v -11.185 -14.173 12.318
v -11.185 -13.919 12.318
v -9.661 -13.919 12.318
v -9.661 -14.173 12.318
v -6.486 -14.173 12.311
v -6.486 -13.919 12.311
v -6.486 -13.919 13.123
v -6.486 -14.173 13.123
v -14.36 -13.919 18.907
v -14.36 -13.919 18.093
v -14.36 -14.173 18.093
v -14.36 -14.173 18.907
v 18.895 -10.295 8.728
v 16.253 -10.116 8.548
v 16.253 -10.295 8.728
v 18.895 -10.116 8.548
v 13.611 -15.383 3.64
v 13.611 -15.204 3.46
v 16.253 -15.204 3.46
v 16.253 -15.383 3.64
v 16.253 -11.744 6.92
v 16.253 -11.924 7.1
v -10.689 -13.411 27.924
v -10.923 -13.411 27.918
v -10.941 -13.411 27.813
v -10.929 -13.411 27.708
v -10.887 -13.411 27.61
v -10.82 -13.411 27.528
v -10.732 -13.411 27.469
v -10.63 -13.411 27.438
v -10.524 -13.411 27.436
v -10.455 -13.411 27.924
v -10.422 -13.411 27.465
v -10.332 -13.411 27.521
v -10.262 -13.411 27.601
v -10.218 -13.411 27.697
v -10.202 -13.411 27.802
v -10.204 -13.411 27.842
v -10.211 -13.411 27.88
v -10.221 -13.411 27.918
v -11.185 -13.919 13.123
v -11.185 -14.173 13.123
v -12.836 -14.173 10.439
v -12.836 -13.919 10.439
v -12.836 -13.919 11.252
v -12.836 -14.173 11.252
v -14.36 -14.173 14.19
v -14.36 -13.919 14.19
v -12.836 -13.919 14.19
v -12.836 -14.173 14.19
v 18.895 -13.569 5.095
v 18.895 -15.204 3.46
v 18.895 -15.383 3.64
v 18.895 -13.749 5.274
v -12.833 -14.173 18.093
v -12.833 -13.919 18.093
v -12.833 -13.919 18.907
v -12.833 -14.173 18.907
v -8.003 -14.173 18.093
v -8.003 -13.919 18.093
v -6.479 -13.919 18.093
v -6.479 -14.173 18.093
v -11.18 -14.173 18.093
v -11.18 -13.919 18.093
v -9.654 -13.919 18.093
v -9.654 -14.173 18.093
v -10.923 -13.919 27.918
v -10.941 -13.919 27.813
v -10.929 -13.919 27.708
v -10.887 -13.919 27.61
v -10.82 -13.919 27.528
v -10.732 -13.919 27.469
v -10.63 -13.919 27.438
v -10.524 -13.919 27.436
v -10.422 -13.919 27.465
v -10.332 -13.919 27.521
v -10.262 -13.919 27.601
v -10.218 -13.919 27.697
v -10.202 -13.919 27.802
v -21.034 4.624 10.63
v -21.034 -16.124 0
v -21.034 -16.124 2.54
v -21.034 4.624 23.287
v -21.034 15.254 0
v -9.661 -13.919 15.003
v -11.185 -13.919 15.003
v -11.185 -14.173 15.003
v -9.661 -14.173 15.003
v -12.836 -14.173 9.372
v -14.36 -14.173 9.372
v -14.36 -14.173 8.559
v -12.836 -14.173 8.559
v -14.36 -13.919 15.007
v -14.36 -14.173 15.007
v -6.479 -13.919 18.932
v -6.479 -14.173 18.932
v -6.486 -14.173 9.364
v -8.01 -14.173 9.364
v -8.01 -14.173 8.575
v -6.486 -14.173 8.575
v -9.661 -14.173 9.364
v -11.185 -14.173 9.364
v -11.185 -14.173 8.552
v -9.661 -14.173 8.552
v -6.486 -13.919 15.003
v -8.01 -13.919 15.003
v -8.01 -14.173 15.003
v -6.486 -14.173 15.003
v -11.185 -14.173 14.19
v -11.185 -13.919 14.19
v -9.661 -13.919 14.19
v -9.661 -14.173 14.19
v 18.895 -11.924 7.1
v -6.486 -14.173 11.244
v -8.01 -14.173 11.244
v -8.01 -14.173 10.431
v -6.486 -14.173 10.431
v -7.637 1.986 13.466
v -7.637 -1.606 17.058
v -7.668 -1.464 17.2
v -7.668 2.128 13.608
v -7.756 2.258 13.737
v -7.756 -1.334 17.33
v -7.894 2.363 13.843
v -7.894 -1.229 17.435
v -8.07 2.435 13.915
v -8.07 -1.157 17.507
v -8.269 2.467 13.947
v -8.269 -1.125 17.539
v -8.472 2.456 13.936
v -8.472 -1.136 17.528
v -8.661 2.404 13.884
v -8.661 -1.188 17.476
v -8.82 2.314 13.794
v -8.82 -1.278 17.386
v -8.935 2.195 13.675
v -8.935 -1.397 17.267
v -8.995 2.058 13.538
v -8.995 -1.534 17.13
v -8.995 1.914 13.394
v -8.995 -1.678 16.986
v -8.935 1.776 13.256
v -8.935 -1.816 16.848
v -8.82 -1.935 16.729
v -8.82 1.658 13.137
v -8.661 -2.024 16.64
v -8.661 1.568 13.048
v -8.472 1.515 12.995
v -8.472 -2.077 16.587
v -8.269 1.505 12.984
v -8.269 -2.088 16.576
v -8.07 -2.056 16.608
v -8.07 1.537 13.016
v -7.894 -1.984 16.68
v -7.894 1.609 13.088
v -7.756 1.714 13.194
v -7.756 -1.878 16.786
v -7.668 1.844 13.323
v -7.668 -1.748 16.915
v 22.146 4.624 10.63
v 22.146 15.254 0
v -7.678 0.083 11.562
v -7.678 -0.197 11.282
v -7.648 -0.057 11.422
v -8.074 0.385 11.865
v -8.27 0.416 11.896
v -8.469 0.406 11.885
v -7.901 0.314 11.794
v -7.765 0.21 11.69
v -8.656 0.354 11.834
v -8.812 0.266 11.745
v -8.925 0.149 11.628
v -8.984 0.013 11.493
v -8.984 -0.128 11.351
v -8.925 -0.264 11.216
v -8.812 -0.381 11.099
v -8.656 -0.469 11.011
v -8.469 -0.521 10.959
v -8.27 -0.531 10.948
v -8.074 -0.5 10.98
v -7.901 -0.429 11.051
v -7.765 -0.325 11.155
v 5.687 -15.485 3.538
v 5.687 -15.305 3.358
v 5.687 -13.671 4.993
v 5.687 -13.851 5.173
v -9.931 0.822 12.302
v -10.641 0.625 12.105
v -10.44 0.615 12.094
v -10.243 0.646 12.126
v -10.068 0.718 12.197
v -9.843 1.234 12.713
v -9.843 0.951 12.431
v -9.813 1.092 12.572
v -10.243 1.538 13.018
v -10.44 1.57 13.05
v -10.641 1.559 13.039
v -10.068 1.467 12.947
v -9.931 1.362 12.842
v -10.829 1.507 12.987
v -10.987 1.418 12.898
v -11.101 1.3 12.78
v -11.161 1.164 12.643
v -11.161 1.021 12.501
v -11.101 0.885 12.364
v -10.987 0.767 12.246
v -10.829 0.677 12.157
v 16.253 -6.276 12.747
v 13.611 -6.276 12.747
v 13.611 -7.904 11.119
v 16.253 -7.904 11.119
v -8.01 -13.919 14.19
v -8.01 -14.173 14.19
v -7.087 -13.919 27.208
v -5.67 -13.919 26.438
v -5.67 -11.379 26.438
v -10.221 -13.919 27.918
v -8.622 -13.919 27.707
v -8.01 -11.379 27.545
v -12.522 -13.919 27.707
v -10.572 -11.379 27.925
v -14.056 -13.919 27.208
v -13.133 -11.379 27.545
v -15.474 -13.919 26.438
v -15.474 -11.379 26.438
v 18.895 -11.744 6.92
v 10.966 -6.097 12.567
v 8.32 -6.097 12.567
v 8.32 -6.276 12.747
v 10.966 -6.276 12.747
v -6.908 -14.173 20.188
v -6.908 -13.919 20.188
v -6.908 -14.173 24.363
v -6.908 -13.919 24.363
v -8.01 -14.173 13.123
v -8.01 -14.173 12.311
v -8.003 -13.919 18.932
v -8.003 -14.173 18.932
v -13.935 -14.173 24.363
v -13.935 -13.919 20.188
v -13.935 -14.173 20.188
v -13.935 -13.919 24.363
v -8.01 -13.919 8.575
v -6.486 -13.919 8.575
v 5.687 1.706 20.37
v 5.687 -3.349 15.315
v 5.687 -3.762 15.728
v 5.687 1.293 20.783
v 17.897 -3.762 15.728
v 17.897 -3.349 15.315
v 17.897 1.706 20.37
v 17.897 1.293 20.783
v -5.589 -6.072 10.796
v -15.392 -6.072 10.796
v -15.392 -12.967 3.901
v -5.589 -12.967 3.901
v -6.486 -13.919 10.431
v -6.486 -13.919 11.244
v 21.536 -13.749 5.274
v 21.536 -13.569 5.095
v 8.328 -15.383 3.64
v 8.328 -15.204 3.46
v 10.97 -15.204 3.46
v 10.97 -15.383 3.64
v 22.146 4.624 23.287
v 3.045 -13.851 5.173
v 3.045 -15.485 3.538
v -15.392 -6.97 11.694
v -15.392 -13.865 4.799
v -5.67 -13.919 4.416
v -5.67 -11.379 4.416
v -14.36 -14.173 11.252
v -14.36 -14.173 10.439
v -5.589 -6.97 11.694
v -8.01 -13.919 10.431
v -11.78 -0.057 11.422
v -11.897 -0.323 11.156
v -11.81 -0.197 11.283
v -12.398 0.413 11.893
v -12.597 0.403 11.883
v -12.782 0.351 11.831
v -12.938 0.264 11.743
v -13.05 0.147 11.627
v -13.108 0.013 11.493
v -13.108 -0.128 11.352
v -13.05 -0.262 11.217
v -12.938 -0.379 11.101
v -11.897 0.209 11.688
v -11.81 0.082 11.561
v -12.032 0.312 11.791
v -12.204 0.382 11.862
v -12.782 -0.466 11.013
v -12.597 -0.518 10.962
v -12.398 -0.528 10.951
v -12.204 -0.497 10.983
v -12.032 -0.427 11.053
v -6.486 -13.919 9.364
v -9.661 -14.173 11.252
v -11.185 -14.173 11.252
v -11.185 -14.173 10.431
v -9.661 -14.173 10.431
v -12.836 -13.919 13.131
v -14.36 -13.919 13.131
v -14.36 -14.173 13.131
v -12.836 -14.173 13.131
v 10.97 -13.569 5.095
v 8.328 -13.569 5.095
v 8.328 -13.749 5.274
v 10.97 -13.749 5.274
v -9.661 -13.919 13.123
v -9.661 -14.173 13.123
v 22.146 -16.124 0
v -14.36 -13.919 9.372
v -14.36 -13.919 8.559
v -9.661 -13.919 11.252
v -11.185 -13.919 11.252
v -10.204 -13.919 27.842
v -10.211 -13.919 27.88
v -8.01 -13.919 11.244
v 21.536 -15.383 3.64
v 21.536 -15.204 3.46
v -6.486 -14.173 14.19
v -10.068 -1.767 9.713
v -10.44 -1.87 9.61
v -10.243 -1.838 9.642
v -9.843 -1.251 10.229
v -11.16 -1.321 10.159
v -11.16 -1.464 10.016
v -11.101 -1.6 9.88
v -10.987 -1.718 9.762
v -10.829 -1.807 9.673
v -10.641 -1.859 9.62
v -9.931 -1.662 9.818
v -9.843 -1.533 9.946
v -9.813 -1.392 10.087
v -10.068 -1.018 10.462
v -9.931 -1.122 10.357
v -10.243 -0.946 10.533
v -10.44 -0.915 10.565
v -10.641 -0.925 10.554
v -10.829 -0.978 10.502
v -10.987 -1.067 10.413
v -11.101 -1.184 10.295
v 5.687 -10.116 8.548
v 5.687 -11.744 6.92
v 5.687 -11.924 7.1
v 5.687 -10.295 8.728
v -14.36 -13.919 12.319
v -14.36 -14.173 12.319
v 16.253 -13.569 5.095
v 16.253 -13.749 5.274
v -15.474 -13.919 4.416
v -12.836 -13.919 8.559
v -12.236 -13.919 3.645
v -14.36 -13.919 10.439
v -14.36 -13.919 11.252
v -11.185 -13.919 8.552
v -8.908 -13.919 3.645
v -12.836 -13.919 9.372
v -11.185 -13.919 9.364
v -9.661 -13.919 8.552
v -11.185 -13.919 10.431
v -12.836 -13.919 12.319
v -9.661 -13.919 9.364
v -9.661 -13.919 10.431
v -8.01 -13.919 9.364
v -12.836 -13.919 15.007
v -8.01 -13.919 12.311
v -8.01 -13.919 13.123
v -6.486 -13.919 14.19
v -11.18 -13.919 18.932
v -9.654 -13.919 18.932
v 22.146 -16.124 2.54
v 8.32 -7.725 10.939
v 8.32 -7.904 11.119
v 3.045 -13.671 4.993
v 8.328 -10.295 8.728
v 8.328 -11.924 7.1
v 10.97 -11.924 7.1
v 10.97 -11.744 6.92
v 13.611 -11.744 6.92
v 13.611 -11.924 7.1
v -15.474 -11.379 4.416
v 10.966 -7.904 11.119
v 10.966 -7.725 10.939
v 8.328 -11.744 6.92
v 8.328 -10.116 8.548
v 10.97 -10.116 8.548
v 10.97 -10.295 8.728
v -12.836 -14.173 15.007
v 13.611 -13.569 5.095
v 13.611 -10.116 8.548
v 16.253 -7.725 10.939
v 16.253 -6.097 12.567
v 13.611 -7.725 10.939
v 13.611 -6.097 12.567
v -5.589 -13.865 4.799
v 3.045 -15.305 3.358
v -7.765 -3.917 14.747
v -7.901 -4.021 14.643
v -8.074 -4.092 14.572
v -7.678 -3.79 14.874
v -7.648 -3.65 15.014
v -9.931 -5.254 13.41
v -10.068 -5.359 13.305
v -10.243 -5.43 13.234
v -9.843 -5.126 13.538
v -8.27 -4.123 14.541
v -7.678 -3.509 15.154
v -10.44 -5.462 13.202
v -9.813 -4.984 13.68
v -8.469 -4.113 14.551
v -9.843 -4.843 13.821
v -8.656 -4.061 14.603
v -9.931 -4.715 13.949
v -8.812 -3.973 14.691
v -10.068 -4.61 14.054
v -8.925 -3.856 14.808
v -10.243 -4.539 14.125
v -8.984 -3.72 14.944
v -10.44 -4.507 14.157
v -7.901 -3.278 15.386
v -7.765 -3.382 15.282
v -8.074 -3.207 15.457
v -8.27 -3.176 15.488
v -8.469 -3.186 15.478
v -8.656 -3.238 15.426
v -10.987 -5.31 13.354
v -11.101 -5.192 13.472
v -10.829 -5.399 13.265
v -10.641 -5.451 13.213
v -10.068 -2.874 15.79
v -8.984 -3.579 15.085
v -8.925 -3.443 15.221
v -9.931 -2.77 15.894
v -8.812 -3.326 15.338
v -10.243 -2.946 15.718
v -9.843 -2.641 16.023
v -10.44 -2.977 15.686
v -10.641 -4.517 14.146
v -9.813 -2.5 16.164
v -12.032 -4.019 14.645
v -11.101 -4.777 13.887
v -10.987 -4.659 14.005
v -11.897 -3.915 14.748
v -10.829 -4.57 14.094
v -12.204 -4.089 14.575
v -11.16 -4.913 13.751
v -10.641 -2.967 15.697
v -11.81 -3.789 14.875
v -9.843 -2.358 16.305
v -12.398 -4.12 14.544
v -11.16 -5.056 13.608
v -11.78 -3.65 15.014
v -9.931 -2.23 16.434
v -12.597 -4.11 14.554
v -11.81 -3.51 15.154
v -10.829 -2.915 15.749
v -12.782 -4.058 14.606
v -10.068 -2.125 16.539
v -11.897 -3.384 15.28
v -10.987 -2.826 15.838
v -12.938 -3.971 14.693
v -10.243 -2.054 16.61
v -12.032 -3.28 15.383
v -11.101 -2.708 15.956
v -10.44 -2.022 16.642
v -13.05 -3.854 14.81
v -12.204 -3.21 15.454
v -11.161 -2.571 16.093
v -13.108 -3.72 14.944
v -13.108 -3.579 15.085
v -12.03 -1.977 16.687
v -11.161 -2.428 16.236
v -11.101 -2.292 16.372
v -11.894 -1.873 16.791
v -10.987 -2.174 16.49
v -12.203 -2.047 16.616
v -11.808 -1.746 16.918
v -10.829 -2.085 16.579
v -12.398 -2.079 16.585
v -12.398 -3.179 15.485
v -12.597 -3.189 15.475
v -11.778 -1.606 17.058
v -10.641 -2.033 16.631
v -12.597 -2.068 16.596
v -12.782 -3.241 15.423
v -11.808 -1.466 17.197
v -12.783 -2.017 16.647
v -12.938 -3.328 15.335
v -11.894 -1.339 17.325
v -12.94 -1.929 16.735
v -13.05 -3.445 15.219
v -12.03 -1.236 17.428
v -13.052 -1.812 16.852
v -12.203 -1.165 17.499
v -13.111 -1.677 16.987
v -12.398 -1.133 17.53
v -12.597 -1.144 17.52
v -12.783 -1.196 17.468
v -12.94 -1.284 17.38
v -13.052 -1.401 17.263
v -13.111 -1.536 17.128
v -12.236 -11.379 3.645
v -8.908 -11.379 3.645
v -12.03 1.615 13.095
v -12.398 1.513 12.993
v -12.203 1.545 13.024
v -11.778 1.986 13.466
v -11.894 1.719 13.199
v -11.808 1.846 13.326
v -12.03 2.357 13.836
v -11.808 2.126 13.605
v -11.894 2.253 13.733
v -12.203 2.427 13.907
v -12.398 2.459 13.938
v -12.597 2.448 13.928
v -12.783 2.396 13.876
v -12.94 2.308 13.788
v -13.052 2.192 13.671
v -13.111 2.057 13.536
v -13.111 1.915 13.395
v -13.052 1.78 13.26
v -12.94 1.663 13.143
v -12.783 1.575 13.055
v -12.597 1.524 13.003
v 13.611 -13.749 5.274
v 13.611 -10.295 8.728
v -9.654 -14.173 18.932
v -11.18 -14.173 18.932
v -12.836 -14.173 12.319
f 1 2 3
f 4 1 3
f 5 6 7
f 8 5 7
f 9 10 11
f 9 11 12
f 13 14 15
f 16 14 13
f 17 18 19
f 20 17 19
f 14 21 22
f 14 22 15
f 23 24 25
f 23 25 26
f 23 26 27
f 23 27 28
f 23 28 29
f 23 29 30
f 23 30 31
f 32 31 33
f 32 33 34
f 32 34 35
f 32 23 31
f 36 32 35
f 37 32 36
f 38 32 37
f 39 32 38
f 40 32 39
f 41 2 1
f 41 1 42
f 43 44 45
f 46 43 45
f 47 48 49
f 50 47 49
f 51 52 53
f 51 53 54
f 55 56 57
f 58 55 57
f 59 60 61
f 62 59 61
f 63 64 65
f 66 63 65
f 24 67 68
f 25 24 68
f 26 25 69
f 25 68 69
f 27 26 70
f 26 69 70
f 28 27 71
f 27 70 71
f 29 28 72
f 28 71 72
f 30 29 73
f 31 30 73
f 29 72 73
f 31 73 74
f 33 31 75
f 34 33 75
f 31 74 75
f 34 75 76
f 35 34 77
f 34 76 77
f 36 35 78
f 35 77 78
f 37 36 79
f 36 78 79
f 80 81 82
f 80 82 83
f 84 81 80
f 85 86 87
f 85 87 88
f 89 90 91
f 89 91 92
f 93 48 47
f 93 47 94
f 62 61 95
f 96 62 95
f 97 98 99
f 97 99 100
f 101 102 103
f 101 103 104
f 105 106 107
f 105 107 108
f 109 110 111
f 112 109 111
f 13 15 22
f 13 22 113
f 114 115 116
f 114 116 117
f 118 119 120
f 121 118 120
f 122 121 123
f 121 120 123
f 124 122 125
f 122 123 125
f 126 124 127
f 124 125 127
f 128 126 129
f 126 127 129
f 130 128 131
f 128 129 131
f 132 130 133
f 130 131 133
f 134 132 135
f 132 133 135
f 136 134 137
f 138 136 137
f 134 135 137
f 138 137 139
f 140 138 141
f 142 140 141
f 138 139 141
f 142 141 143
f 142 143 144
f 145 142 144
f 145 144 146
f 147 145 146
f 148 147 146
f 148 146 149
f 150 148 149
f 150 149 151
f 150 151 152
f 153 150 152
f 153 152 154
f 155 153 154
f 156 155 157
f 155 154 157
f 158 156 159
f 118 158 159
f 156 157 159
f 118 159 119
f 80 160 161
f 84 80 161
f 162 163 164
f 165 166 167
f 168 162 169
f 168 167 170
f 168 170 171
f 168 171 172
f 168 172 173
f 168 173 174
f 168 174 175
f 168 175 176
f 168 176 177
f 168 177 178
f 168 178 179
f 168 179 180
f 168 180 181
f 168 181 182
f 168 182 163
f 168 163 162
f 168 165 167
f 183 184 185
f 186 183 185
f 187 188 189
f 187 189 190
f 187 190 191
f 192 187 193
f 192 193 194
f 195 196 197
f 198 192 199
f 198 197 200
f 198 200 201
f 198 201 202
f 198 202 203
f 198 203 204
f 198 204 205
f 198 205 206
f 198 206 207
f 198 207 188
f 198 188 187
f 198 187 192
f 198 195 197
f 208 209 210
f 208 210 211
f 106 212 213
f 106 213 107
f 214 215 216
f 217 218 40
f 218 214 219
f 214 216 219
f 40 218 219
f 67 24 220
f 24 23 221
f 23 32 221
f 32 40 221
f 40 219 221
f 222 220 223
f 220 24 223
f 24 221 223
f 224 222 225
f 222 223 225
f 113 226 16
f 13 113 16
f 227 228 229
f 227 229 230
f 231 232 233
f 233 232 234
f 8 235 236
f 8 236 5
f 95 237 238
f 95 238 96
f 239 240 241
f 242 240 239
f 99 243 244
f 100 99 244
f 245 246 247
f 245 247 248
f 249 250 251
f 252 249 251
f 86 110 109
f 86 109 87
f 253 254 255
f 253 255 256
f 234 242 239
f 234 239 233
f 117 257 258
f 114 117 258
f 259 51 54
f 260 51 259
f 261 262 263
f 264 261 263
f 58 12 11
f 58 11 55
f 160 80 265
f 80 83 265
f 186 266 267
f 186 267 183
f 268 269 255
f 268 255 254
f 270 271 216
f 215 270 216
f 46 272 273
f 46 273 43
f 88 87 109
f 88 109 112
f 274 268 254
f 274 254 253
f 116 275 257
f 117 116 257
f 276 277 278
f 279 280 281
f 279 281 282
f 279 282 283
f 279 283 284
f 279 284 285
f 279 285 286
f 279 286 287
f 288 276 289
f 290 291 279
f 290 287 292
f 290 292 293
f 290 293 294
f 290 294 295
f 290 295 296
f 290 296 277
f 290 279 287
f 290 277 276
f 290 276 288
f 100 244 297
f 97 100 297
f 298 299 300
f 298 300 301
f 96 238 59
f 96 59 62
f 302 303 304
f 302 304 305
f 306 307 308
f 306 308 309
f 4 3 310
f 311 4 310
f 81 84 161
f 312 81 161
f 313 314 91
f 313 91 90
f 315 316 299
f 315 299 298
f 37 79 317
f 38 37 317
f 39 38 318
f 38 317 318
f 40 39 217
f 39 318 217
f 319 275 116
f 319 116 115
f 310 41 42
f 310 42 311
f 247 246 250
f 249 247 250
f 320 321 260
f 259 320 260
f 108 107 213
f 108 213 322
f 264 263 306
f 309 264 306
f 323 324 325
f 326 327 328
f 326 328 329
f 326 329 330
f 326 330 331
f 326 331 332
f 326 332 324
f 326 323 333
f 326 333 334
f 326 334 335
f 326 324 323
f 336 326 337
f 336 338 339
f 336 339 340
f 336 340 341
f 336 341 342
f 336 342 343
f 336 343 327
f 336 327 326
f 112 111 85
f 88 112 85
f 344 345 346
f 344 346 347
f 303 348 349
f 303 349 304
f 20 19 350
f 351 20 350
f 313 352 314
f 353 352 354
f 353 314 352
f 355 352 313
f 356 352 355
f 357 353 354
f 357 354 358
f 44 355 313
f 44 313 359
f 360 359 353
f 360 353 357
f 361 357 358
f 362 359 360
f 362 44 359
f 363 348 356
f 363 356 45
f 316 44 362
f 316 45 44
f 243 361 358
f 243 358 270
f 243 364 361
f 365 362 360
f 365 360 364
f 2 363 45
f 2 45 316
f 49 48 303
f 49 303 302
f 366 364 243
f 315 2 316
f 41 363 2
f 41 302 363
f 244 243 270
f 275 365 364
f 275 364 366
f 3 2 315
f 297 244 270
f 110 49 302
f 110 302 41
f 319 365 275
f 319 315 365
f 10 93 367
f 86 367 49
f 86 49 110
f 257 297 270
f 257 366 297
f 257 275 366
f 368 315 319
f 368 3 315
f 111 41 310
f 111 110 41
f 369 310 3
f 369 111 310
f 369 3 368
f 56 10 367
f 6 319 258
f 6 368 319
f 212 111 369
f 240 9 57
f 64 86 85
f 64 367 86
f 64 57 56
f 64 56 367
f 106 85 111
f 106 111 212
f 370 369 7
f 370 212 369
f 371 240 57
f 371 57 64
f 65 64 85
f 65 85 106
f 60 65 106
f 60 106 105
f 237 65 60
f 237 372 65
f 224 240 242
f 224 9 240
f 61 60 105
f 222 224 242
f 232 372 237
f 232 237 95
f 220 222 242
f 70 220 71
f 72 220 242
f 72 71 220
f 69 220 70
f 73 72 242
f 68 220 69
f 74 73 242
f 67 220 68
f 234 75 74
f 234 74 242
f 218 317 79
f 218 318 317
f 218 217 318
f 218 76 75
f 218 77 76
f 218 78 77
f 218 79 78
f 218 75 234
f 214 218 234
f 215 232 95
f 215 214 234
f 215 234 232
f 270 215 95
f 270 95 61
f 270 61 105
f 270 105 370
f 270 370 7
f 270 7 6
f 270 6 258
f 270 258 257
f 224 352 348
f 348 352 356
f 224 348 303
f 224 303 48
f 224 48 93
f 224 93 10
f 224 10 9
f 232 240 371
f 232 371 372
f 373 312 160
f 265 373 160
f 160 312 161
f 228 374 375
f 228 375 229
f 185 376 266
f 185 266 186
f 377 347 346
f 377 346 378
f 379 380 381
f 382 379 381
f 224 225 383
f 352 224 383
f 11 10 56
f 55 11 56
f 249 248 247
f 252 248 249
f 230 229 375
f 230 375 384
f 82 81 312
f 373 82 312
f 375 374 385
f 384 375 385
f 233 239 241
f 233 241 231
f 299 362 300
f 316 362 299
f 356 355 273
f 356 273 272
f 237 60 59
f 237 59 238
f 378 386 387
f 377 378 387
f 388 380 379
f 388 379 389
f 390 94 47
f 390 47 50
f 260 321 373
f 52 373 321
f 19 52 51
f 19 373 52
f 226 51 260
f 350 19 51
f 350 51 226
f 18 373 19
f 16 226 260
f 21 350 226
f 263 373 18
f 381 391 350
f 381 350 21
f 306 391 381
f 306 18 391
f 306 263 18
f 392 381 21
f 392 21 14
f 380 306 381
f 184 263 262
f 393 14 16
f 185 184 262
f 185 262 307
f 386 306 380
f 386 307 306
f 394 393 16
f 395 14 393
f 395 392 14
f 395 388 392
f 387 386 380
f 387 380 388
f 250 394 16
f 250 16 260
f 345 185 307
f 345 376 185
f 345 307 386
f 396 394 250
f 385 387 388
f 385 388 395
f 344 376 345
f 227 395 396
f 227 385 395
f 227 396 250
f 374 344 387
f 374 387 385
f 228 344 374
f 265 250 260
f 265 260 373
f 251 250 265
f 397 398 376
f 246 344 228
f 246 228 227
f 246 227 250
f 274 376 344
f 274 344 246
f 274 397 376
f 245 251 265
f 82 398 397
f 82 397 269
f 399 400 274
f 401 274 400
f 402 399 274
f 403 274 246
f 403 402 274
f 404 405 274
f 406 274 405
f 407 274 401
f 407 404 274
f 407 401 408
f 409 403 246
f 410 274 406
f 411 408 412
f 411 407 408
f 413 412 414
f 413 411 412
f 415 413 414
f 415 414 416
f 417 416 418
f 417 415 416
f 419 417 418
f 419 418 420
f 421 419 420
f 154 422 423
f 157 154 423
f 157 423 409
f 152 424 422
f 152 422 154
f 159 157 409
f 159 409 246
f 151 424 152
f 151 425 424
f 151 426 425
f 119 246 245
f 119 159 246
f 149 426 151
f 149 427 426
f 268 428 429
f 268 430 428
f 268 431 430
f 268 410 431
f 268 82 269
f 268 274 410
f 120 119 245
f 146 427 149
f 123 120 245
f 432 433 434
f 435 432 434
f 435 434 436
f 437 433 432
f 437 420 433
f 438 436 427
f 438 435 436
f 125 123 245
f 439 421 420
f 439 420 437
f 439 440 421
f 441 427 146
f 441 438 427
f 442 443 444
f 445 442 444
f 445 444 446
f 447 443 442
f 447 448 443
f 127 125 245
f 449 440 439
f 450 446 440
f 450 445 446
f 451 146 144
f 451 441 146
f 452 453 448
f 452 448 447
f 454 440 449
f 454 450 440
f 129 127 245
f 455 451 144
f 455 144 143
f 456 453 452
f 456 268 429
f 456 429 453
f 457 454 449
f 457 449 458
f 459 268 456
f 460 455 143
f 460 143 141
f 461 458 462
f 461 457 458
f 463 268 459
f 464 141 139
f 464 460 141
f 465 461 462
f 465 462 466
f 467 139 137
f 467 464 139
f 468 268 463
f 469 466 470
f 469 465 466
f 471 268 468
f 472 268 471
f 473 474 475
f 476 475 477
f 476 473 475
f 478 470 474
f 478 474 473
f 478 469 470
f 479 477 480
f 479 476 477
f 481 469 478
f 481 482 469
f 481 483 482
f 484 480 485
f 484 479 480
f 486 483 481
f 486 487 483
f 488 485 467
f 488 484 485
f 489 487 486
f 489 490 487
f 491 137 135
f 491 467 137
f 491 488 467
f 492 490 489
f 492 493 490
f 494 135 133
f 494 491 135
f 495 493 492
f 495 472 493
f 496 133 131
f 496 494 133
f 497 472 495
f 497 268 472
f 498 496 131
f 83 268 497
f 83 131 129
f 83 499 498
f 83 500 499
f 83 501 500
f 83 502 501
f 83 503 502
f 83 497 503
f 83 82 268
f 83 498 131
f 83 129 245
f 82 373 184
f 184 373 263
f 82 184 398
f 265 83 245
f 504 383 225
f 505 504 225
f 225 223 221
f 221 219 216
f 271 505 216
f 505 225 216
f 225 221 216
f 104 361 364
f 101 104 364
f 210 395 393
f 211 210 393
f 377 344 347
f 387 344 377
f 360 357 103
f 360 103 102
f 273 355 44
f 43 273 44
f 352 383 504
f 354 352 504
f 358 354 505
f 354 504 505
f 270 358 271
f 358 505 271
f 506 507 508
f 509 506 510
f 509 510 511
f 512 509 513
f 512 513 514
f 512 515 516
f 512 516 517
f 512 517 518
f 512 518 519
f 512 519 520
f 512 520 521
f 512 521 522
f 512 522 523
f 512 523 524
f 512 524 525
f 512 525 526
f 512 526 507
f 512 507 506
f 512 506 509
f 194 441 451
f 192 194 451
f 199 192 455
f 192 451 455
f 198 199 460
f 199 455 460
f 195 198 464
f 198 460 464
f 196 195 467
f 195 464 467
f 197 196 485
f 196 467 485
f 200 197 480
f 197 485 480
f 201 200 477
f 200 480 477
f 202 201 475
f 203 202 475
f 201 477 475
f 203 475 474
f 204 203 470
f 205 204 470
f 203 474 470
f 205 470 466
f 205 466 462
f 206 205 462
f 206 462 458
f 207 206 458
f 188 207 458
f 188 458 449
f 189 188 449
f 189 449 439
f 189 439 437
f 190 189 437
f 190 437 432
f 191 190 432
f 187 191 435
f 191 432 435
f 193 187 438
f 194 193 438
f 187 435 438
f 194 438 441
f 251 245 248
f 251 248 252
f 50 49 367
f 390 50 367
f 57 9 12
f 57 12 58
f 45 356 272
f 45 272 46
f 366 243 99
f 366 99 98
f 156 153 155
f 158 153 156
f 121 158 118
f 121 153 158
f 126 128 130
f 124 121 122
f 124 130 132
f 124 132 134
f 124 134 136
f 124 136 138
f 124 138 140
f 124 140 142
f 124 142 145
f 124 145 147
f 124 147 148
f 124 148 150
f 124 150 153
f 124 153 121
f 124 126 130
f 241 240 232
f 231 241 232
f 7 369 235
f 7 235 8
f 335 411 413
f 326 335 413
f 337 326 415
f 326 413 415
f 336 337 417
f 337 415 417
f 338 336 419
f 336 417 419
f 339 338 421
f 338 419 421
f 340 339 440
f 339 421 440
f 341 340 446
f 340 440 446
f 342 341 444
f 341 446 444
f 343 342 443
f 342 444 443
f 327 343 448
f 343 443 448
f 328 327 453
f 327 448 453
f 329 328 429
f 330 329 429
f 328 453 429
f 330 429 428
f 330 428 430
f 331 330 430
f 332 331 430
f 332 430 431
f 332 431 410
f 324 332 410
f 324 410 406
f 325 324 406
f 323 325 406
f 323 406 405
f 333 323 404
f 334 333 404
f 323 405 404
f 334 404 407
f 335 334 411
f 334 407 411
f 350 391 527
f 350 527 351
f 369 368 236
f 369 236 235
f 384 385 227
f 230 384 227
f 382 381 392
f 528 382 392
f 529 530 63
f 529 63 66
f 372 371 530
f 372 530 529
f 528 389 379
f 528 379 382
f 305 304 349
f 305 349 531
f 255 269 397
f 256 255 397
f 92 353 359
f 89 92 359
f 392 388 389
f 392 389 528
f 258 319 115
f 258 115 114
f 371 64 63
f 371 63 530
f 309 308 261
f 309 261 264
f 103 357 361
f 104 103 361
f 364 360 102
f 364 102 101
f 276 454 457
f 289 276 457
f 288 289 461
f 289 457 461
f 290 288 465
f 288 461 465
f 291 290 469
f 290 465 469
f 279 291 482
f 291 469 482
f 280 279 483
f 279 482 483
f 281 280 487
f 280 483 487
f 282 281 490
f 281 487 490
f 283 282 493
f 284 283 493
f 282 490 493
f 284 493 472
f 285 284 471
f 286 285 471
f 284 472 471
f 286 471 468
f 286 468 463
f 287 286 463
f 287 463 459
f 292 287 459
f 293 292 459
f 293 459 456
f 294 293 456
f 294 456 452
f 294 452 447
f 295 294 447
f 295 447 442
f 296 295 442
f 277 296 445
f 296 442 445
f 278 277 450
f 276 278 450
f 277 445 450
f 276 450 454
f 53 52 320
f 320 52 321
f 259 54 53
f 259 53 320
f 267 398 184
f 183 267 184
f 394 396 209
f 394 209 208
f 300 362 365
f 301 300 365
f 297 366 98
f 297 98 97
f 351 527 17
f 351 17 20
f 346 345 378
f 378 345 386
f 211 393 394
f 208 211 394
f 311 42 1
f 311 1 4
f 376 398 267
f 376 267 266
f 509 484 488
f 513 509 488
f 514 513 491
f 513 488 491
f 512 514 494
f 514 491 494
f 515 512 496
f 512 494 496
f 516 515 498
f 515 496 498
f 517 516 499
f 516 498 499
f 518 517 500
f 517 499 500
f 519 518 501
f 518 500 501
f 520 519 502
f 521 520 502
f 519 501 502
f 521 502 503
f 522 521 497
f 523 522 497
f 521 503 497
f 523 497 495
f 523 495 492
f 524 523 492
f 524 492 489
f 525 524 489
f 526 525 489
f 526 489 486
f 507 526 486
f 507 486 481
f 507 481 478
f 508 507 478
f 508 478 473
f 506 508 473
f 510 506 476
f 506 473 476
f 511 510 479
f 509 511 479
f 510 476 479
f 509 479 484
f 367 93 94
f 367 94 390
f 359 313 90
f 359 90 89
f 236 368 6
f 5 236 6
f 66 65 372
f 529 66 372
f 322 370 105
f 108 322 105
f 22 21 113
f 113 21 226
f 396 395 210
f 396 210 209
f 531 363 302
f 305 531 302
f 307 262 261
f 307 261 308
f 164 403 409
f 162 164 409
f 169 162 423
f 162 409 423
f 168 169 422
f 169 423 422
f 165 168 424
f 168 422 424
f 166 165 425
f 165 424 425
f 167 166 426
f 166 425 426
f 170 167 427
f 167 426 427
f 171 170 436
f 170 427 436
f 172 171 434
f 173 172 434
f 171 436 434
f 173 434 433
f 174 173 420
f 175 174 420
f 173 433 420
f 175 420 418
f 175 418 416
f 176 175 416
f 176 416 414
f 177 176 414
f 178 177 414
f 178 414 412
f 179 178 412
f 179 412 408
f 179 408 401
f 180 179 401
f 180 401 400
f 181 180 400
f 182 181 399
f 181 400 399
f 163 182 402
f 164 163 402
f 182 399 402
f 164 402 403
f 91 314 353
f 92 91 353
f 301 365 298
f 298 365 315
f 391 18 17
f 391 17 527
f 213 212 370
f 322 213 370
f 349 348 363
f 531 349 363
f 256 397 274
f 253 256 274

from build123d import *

# Parameters (mm, degrees)
F0_W        = 43.18
F0_H        = 20.7474600966
F1_DEPTH    = 25.4
F0_H_2      = 10.629949436
F2_DEPTH    = 12.7
F3_T1_DEPTH = 160.7573462098
F4_T4_DEPTH = 108.5007478943
F5_W        = 9.8024089821
F5_H        = 9.7506272141
F6_DEPTH    = 1.27
F7_W        = 2.6456220075
F7_H        = 2.3024471011
F7_W_2      = 2.6416
F7_H_2      = 2.3024467519
F7_H_3      = 2.3114
F8_DEPTH    = 0.254
F7_W_3      = 12.2105642222
F7_H_4      = 7.1489069227
F9_DEPTH    = 0.5842
F11_DEPTH   = 2.54
F13_W       = 1.524
F13_H       = 0.8168006316
F13_H_2     = 0.8128
F13_H_3     = 0.8049504831
F13_H_4     = 0.82042
F13_H_5     = 0.7896171883
F13_W_2     = 1.5263203532
F13_H_6     = 0.8140373975
F13_H_7     = 0.8394755423
F13_W_3     = 7.0272386074
F13_H_8     = 4.1753165424
F14_DEPTH   = 0.254
F15_DEPTH   = 0.508
F16_R       = 0.6775746303
F16_R_2     = 0.6719535835
F16_R_3     = 0.6676399197
F16_R_4     = 0.6773005459
F16_R_5     = 0.6826296901
F16_R_6     = 0.6703978175
F17_DEPTH   = 5.08


# Not quite as in the source:
# - a fillet or chamfer that OpenCascade refuses, or shapes differently, is made with other operations: its cross-section is extruded or revolved along the edge and cut away or added
# - a feature names something its author has since deleted; it is built from what else it names


with BuildPart() as f1:
    # F0 (on Top) → F1 (new body)
    with BuildSketch(Plane.XY):
        with Locations((0.5560219288, -5.7501500921)):
            Rectangle(F0_W, F0_H)
    extrude(amount=F1_DEPTH)

    # F0 (on Top) → F2 (join)
    with BuildSketch(Plane.XY):
        with Locations((0.5560219288, 9.9385546742)):
            Rectangle(F0_W, F0_H_2)
    extrude(amount=F2_DEPTH)

    # F3: chamfer of 22.86 on 1 edges, made by hand

    # F3_s2 → F3_t1 (cut)
    with BuildSketch(Plane.YZ.offset(-79.8226511761)):
        Polygon((-16.1238801405, 2.54), (6.7361198595, 25.4), (-16.1238801405, 25.4), align=None)
    extrude(amount=F3_T1_DEPTH, mode=Mode.SUBTRACT)

    # F4: chamfer of 12.7 on 1 edges, made by hand


with BuildPart() as f4_tool2:
    # F4_s3 → F4_t4 (new body)
    with BuildSketch(Plane.YZ.offset(54.806395876)):
        Polygon((2.5535293922, 12.7), (15.2535293922, 0), (15.2535293922, 12.7), align=None)
    extrude(amount=-F4_T4_DEPTH)

    split(bisect_by=Plane.XZ.offset(-4.6235799562), keep=Keep.BOTTOM)


with BuildPart() as f1_1:
    add(f1.part)

    # F4_t1: cut F4_tool2
    add(f4_tool2.part, mode=Mode.SUBTRACT)

    # F5 (on face) → F6 (cut)
    with BuildSketch(Plane(origin=(0, -9.3319400702, 9.3319400702), x_dir=(1, 0, 0), z_dir=(0, -0.7071067812, 0.7071067812))):
        with Locations((-10.4905848857, -1.5347840963)):
            Rectangle(F5_W, F5_H)
    extrude(amount=-F6_DEPTH, mode=Mode.SUBTRACT)

    # F7 (on face) → F8 (join)
    with BuildSketch(Plane(origin=(0, -9.3319400702, 9.3319400702), x_dir=(1, 0, 0), z_dir=(0, -0.7071067812, 0.7071067812))):
        with Locations((9.6429114781, 3.4242669353)):
            Rectangle(F7_W, F7_H)
        with Locations((14.9321444894, 3.4242669353)):
            Rectangle(F7_W_2, F7_H)
        with Locations((7.0073444894, -2.2598968935)):
            Rectangle(F7_W_2, F7_H_2)
        with Locations((12.2905444894, -2.2598968935)):
            Rectangle(F7_W_2, F7_H_2)
        with Locations((17.5737444894, -2.2598968935)):
            Rectangle(F7_W_2, F7_H_2)
        with Locations((4.3657444894, -7.2920206692)):
            Rectangle(F7_W_2, F7_H_3)
        with Locations((9.6489444894, -7.1481164303)):
            Rectangle(F7_W_2, F7_H_3)
        with Locations((14.9321444894, -7.1481164303)):
            Rectangle(F7_W_2, F7_H_3)
        with Locations((20.2153444894, -7.1481164303)):
            Rectangle(F7_W_2, F7_H_3)
    extrude(amount=F8_DEPTH)

    # F7 (on face) → F9 (join)
    with BuildSketch(Plane(origin=(0, -9.3319400702, 9.3319400702), x_dir=(1, 0, 0), z_dir=(0, -0.7071067812, 0.7071067812))):
        with Locations((11.7918266005, 12.0353225427)):
            Rectangle(F7_W_3, F7_H_4)
    extrude(amount=F9_DEPTH)

    # F16 (on face) → F17 (cut)
    with BuildSketch(Plane(origin=(0, -9.3319400702, 9.3319400702), x_dir=(1, 0, 0), z_dir=(0, -0.7071067812, 0.7071067812))):
        with Locations((-10.4905848857, 9.6622304991)):
            Circle(F16_R)
        with Locations((-8.3198184147, 8.0361571163)):
            Circle(F16_R_2)
        with Locations((-12.4481311068, 8.0361571163)):
            Circle(F16_R_3)
        with Locations((-10.4905848857, 6.1483839527)):
            Circle(F16_R_4)
        with Locations((-8.3198184147, 10.9258340672)):
            Circle(F16_R_5)
        with Locations((-12.4481311068, 10.9258340672)):
            Circle(F16_R_6)
    extrude(amount=-F17_DEPTH, mode=Mode.SUBTRACT)


with BuildPart() as f11:
    # F10 (on Front) → F11 (new body)
    with BuildSketch(Plane.XZ):
        with BuildLine():
            ThreePointArc((49.9308869097, 22.6276024803), (45.0286869097, 24.1148820906), (40.1264869097, 22.6276024803))
            Line((40.1264869097, 22.6276024803), (40.1264869097, 0.6058024803))
            ThreePointArc((40.1264869097, 0.6058024803), (45.0286869097, -0.2623128577), (49.9308869097, 0.6058024803))
            Line((49.9308869097, 0.6058024803), (49.9308869097, 22.6276024803))
        make_face()
    extrude(amount=F11_DEPTH)


with BuildPart() as f11_1:
    # F12: moved
    add(f11.part.moved(Location((-55.6006, -11.3792, 3.81))))

    # F13 (on face) → F14 (join)
    with BuildSketch(Plane.XZ.offset(13.9192)):
        with Locations((-13.5976772105, 14.5986099907)):
            Rectangle(F13_W, F13_H)
        with Locations((-10.4226772105, 14.596609675)):
            Rectangle(F13_W, F13_H_2)
        with Locations((-13.5976772105, 12.7249955591)):
            Rectangle(F13_W, F13_H_2)
        with Locations((-10.4226772105, 12.7209344334)):
            Rectangle(F13_W, F13_H_3)
        with Locations((-7.2476772105, 12.717009675)):
            Rectangle(F13_W, F13_H_2)
        with Locations((-7.2476772105, 14.596609675)):
            Rectangle(F13_W, F13_H_2)
        with Locations((-10.4226772105, 10.8414491918)):
            Rectangle(F13_W, F13_H_4)
        with Locations((-7.2476772105, 10.837409675)):
            Rectangle(F13_W, F13_H_2)
        with Locations((-7.2476772105, 8.9694010808)):
            Rectangle(F13_W, F13_H_5)
        with Locations((-10.4226772105, 8.9580391918)):
            Rectangle(F13_W, F13_H_2)
        with Locations((-13.5976772105, 8.9657955591)):
            Rectangle(F13_W, F13_H_2)
        with Locations((-13.5976772105, 10.8453955591)):
            Rectangle(F13_W, F13_H_2)
        with Locations((-13.5965170339, 18.4998149052)):
            Rectangle(F13_W_2, F13_H_6)
        with Locations((-10.4166828096, 18.5125339776)):
            Rectangle(F13_W_2, F13_H_7)
        with Locations((-7.240522633, 18.5125339776)):
            Rectangle(F13_W, F13_H_7)
        with Locations((-10.4216868058, 22.2753062844)):
            Rectangle(F13_W_3, F13_H_8)
    extrude(amount=F14_DEPTH)

    # F13 (on face) → F15 (cut)
    with BuildSketch(Plane.XZ.offset(13.9192)):
        with BuildLine():
            ThreePointArc((-10.9229198271, 27.9178969903), (-10.5719130903, 27.9248820906), (-10.2209063536, 27.9178969903))
            ThreePointArc((-10.2209063536, 27.9178969903), (-10.5719130903, 28.171962803), (-10.9229198271, 27.9178969903))
        make_face()
        with BuildLine():
            ThreePointArc((-10.9229198271, 27.9178969903), (-10.6303667733, 27.4376135857), (-10.2024120456, 27.8024617583))
            ThreePointArc((-10.2024120456, 27.8024617583), (-10.2070649178, 27.8609154413), (-10.2209063536, 27.9178969903))
            ThreePointArc((-10.2209063536, 27.9178969903), (-10.5719130903, 27.9248820906), (-10.9229198271, 27.9178969903))
        make_face()
    extrude(amount=-F15_DEPTH, mode=Mode.SUBTRACT)


solid = Compound([f1_1.part, f11_1.part])
